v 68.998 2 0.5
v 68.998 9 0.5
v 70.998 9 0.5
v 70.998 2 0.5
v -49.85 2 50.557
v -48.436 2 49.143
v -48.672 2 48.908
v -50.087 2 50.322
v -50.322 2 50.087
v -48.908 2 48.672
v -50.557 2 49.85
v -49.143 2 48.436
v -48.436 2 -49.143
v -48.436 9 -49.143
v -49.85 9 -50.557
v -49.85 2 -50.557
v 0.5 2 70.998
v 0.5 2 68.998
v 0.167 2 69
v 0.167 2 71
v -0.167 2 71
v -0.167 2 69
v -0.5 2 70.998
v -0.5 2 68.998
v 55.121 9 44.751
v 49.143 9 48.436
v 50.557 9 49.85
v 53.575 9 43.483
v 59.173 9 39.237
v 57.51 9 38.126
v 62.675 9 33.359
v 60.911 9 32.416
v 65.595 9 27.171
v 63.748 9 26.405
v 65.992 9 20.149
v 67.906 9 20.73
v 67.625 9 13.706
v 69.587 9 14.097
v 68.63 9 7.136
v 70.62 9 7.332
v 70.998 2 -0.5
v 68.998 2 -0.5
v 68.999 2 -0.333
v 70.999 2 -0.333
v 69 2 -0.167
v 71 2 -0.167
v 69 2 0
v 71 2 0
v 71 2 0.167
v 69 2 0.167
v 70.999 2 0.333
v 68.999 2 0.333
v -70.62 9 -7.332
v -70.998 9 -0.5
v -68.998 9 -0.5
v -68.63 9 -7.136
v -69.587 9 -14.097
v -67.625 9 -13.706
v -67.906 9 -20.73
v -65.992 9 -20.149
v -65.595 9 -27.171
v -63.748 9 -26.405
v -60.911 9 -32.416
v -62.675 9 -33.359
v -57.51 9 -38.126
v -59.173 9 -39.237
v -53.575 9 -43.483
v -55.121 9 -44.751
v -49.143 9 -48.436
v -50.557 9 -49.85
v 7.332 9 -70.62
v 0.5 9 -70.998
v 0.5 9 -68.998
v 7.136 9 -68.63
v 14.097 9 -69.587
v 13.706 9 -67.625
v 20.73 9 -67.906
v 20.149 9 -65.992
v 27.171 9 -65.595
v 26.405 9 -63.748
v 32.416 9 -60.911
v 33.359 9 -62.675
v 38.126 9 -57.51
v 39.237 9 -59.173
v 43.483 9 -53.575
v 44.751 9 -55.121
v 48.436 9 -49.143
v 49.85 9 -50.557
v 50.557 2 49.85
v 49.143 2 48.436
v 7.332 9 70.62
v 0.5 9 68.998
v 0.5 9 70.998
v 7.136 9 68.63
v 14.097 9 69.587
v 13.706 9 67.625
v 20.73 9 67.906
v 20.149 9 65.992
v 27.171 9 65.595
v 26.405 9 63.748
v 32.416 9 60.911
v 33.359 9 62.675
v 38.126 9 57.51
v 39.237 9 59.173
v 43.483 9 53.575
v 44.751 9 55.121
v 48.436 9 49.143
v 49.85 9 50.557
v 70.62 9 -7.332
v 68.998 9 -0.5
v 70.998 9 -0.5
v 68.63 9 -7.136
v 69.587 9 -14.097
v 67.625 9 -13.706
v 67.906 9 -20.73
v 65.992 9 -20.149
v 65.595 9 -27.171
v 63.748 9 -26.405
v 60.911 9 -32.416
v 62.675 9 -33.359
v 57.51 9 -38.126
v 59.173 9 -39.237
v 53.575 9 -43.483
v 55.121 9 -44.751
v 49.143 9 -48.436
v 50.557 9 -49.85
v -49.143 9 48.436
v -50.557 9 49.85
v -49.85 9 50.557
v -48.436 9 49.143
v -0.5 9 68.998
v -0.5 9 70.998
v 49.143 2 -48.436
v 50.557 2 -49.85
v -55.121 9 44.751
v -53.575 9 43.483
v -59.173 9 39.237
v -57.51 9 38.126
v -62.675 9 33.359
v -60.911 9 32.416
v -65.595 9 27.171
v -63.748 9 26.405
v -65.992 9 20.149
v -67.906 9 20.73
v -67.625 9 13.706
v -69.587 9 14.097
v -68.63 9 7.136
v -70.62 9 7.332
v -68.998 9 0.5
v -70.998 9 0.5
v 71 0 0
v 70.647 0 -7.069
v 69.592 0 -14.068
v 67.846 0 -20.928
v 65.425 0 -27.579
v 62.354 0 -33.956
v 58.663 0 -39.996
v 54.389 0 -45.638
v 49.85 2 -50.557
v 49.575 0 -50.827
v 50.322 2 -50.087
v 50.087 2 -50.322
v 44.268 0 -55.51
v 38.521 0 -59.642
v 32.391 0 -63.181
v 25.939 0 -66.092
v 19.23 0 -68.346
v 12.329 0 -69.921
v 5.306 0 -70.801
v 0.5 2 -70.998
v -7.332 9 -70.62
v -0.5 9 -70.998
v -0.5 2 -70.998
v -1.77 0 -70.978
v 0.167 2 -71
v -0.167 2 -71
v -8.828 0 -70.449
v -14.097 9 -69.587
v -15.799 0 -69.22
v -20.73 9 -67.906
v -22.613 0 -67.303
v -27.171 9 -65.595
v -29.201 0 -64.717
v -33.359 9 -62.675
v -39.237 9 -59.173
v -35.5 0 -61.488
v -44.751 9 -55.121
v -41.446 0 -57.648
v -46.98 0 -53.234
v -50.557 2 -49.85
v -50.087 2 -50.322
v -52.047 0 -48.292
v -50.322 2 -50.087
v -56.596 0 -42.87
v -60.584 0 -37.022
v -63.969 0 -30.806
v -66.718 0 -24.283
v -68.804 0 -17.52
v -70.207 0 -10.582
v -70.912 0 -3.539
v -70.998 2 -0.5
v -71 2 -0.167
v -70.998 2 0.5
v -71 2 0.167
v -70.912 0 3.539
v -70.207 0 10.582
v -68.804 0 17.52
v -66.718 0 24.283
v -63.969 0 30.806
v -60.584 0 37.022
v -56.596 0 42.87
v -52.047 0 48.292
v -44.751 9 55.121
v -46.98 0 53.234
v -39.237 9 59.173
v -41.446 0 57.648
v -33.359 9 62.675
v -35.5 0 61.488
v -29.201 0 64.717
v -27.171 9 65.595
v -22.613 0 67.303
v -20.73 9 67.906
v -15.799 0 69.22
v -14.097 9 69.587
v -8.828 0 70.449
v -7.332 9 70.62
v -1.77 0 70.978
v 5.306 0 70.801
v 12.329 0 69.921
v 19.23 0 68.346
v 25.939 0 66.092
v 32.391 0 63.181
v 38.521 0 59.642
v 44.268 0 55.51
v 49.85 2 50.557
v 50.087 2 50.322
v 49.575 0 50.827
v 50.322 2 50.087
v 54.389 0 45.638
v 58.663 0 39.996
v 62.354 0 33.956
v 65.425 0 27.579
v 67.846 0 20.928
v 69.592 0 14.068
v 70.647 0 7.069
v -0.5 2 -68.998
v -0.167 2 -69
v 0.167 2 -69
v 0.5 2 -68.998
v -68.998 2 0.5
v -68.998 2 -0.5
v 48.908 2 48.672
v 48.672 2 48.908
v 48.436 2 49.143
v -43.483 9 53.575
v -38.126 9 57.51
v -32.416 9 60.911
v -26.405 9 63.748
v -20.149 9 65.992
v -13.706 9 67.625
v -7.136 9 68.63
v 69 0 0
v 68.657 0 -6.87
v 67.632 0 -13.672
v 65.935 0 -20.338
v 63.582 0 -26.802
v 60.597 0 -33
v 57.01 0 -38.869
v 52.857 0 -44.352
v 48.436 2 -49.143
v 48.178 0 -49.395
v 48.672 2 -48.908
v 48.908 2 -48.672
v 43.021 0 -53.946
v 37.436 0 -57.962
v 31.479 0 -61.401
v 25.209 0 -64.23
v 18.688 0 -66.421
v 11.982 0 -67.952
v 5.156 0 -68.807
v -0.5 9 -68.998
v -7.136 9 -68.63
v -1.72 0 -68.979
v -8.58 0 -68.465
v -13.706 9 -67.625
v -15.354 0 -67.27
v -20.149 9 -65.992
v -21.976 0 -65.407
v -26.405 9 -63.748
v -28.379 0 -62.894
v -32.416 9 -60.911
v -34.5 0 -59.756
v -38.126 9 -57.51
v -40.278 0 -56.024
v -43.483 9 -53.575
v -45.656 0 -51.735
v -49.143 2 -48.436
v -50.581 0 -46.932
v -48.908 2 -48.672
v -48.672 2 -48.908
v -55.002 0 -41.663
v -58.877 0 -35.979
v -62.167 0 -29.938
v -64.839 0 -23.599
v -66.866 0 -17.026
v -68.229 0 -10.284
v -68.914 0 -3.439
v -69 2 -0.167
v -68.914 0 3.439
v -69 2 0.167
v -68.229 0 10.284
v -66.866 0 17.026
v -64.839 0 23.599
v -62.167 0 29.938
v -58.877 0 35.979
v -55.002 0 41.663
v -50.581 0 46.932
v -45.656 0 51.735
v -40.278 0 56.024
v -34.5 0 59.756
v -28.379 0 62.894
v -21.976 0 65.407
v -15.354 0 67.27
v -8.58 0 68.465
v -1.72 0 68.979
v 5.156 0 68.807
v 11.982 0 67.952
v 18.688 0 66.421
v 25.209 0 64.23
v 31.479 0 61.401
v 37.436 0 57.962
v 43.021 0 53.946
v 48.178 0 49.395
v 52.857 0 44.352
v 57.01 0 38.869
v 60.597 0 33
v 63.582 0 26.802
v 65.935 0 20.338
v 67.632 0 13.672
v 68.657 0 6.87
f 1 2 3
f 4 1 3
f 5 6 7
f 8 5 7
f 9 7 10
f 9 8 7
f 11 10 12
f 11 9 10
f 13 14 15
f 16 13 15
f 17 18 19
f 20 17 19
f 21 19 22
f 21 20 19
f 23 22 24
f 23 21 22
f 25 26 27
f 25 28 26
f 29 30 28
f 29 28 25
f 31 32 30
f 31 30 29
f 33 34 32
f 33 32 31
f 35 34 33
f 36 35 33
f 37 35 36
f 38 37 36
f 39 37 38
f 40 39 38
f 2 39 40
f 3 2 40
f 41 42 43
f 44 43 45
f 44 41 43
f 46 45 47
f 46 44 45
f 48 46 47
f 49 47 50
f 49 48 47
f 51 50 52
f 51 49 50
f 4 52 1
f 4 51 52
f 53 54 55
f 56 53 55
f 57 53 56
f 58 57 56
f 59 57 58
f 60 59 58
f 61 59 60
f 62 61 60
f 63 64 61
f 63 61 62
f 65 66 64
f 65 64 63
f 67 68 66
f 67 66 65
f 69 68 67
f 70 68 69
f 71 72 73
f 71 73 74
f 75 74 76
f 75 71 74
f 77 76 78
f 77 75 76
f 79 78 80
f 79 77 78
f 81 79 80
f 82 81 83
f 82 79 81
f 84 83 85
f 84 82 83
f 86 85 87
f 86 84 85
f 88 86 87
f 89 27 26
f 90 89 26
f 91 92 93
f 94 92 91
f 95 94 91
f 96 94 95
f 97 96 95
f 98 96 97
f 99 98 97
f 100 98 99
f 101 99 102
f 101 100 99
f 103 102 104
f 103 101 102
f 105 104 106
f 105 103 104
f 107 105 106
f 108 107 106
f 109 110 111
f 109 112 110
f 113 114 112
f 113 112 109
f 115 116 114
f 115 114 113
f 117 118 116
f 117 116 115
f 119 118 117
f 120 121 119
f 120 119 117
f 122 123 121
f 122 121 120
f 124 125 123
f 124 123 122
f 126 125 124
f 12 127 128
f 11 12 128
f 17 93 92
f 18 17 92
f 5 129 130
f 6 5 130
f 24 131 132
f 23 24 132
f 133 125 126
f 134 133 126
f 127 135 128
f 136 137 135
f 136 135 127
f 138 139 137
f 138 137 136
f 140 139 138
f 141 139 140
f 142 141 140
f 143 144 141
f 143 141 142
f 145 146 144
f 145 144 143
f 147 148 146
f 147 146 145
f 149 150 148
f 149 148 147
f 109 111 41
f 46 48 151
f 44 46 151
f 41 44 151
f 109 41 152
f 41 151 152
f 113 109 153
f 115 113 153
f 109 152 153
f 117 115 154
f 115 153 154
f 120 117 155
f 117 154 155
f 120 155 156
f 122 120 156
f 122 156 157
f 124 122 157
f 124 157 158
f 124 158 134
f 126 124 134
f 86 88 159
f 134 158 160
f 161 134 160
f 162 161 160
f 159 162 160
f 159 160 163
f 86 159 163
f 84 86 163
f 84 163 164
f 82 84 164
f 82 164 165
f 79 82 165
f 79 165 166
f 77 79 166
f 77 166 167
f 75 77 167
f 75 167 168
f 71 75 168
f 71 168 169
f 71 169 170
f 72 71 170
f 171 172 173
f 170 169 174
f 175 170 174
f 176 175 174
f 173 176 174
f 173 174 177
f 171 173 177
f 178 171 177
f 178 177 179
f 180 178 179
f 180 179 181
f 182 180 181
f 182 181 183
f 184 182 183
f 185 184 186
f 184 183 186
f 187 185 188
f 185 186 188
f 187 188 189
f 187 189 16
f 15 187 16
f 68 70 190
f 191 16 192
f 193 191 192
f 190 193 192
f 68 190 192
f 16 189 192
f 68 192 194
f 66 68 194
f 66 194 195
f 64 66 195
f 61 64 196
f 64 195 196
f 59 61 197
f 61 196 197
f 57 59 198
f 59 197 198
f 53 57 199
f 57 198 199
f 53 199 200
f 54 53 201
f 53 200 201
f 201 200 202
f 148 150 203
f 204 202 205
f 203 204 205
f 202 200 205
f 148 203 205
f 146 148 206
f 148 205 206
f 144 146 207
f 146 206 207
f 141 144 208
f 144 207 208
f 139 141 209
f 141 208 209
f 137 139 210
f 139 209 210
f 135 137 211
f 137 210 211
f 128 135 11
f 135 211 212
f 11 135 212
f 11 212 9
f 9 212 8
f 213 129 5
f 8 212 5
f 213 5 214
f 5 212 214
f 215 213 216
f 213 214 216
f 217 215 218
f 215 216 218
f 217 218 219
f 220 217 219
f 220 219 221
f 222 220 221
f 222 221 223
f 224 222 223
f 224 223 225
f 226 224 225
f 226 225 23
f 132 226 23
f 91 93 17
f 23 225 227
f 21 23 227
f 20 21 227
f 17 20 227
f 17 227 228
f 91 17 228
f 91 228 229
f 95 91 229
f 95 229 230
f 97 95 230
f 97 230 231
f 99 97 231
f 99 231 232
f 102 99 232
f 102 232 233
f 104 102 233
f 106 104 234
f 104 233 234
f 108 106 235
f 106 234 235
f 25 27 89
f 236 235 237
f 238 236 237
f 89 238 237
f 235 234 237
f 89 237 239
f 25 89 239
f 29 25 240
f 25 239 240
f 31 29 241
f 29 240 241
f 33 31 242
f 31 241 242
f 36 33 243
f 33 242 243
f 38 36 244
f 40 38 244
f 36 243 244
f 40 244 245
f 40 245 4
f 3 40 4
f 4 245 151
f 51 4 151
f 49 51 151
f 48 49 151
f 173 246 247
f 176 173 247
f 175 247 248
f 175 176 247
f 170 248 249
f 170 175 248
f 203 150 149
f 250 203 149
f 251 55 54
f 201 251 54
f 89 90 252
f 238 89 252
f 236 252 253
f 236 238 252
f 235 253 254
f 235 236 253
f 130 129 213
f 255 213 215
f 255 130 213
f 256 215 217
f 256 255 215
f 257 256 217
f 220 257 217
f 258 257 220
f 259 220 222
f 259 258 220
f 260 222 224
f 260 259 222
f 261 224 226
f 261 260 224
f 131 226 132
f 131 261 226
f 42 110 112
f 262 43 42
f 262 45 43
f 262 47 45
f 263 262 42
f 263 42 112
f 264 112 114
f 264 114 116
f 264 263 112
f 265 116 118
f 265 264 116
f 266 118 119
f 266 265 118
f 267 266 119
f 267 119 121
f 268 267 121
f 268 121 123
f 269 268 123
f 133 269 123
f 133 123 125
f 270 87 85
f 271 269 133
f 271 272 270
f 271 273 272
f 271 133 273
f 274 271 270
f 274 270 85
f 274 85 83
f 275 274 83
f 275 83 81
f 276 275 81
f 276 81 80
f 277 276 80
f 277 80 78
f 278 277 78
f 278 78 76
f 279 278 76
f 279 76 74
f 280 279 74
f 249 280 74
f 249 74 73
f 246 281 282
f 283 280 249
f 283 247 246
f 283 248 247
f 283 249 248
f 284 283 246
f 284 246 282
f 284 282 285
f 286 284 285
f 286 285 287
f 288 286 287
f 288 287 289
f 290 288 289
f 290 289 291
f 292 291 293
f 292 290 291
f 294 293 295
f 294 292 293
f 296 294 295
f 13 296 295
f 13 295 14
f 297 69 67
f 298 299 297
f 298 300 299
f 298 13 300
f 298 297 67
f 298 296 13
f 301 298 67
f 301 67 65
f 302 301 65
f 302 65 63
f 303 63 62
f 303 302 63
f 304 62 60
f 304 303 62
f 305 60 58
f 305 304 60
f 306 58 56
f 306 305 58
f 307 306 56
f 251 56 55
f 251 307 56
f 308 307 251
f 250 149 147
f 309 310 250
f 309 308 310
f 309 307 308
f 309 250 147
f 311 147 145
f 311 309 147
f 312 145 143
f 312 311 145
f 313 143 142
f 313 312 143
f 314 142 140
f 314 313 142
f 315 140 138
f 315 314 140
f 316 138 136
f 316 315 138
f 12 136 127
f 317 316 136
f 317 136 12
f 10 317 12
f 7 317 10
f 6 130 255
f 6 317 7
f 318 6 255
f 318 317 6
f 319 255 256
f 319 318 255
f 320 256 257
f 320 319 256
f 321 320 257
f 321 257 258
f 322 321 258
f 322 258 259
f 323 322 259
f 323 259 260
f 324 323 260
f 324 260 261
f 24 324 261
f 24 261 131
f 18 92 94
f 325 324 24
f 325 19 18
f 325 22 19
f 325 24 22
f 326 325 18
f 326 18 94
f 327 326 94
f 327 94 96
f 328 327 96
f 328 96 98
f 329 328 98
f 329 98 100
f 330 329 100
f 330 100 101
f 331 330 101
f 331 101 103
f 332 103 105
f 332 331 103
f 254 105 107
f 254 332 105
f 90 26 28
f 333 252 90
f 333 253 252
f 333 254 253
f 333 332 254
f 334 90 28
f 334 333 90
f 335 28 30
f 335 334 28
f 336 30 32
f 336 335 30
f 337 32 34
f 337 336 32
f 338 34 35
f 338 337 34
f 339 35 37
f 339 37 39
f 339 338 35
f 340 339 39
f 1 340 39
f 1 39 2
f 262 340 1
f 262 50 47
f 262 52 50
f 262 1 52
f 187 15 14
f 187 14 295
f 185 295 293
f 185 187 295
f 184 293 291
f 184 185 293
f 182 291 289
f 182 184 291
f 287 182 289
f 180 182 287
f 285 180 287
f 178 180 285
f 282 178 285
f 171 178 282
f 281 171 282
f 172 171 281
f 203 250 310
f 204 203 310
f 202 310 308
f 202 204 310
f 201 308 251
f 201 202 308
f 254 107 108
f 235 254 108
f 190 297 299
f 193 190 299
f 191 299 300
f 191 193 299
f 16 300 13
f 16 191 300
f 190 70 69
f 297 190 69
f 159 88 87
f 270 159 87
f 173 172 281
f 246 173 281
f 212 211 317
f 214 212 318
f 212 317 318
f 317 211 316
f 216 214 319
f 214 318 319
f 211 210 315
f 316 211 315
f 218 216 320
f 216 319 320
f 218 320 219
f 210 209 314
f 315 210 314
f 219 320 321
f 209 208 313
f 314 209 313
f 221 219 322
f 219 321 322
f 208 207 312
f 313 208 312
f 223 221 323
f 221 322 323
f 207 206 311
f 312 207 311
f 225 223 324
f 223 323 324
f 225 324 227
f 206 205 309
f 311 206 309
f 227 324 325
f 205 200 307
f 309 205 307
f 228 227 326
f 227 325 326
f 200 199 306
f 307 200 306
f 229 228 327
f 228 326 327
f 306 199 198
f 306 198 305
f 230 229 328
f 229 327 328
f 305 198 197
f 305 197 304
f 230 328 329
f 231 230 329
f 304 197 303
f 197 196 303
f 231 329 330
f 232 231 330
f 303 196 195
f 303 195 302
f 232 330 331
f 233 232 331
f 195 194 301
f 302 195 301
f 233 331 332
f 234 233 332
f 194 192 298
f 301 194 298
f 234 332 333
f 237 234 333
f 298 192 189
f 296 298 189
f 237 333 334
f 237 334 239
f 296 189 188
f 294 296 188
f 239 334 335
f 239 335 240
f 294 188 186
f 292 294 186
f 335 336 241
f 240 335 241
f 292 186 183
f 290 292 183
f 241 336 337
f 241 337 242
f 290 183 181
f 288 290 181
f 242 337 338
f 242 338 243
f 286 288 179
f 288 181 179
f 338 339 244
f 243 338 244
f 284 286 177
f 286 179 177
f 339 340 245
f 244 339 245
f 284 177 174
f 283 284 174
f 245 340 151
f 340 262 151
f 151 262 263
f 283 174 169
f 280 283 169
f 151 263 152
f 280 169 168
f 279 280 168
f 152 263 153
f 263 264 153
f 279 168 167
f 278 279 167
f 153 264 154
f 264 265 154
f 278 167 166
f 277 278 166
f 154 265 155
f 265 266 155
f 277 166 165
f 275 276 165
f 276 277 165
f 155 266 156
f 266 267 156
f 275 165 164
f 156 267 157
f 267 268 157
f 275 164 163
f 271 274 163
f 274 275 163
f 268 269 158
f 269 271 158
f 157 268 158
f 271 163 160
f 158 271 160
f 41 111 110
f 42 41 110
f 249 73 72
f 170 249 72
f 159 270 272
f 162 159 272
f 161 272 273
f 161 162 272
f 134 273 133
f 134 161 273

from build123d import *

# Parameters (mm, degrees)
SKETCH1_R           = 71
SKETCH1_R_2         = 69
BOSS_EXTRUDE1_DEPTH = 9
CUT_EXTRUDE1_DEPTH  = 7
CIRPATTERN1_COUNT   = 8


with BuildPart() as part:
    # Sketch1 → Boss-Extrude1 (new body)
    with BuildSketch(Plane(origin=(0, 0, 0), x_dir=(1, 0, 0), z_dir=(0, 1, 0))):
        Circle(SKETCH1_R)
        Circle(SKETCH1_R_2, mode=Mode.SUBTRACT)
    extrude(amount=BOSS_EXTRUDE1_DEPTH)

    # Sketch2 → Cut-Extrude1 (cut)
    with BuildSketch(Plane(origin=(0, 9, 0), x_dir=(1, 0, 0), z_dir=(0, 1, 0))):
        with BuildLine():
            Line((0.5, 68.998188382), (0.5, 70.998239415))
            ThreePointArc((0.5, 70.998239415), (0, 71), (-0.5, 70.998239415))
            Line((-0.5, 70.998239415), (-0.5, 68.998188382))
            ThreePointArc((-0.5, 68.998188382), (0, 69), (0.5, 68.998188382))
        make_face()
    cut_extrude1 = extrude(amount=-CUT_EXTRUDE1_DEPTH, mode=Mode.SUBTRACT)

    # CirPattern1: Cut-Extrude1 ×8 about axis
    cirpattern1_axis = Axis((0, 0, 0), (0, 1, 0))
    for i in range(1, CIRPATTERN1_COUNT):
        add(cut_extrude1.rotate(cirpattern1_axis, i * 360 / CIRPATTERN1_COUNT), mode=Mode.SUBTRACT)


solid = part.part
